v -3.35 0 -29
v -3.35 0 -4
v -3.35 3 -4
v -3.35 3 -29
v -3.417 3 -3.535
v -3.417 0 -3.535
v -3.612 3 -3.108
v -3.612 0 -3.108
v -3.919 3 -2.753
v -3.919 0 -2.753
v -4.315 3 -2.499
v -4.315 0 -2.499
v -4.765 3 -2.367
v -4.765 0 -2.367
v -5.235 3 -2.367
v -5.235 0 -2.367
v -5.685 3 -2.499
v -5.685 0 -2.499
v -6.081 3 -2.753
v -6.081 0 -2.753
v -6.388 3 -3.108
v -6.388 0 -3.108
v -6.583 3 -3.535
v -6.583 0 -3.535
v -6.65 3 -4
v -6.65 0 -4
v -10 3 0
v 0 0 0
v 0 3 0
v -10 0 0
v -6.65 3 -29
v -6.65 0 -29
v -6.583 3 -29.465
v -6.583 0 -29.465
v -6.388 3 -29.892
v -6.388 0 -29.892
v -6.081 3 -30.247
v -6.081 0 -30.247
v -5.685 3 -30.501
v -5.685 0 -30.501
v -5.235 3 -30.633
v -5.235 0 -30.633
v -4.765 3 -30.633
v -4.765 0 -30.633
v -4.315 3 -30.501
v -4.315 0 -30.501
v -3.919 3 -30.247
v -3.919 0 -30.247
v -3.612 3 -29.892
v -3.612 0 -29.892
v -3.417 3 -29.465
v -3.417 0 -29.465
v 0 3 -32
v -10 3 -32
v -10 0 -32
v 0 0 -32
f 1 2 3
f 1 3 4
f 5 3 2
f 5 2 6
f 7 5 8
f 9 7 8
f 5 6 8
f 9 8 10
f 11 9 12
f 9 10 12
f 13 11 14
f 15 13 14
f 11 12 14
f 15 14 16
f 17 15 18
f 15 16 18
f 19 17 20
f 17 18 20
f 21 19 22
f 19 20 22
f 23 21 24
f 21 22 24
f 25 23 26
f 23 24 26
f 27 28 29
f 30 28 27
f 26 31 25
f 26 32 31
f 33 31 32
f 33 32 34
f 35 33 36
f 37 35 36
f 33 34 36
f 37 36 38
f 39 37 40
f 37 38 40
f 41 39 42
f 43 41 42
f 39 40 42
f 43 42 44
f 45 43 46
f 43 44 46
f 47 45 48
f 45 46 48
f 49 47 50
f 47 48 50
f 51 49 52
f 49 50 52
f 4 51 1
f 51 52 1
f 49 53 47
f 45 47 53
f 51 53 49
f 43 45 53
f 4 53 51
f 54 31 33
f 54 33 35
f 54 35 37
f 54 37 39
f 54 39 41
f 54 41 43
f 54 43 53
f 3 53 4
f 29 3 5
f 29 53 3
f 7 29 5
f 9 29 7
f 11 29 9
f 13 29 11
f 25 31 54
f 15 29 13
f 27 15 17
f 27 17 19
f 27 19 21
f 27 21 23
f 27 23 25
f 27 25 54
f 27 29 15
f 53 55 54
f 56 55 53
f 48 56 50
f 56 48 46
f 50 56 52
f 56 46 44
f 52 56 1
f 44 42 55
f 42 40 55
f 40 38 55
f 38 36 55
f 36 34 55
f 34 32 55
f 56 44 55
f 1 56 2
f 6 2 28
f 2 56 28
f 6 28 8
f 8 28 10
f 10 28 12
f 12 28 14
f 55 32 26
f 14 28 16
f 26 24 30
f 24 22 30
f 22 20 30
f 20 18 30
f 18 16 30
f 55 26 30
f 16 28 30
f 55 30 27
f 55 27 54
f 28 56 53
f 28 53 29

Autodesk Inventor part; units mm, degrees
ref_plane "YZ Plane" through (0, 0, 0) normal (1, 0, 0) x (0, 1, 0)
ref_plane "XZ Plane" through (0, 0, 0) normal (0, 1, 0) x (-1, 0, 0)
ref_plane "XY Plane" through (0, 0, 0) normal (0, 0, 1) x (1, 0, 0)
sketch "Sketch1" plane through (0, 0, 0) normal (0, 1, 0) x (-1, 0, 0)
  line L0 (0, 0) -> (10, 0)
  line L1 (10, 0) -> (10, -32)
  line L2 (10, -32) -> (0, -32)
  line L3 (0, -32) -> (0, 0)
  line L4 (5, 0) -> (5, -4)
  line L5 (5, -32) -> (5, -29)
  line L6 (5, -4) -> (5, -29) construction
  line L7 (3.35, -4) -> (3.35, -29)
  line L8 (6.65, -29) -> (6.65, -4)
  arc A0 (6.65, -4) -> (3.35, -4) centre (5, -4) ccw
  arc A1 (3.35, -29) -> (6.65, -29) centre (5, -29) ccw
  point P0 (5, -16.5)
  dimension "d0" = 10
  dimension "d1" = 32
  dimension "d2" = 4
  dimension "d3" = 3
  dimension "d4" = 3.3
extrude "Extrusion1" add sketch "Sketch1" along normal blind 3 contours L0 L4 A0 L7 A1 L5 L2 L3 | L0 L1 L2 L5 A1 L8 A0 L4
properties part number "BeltMount2"
